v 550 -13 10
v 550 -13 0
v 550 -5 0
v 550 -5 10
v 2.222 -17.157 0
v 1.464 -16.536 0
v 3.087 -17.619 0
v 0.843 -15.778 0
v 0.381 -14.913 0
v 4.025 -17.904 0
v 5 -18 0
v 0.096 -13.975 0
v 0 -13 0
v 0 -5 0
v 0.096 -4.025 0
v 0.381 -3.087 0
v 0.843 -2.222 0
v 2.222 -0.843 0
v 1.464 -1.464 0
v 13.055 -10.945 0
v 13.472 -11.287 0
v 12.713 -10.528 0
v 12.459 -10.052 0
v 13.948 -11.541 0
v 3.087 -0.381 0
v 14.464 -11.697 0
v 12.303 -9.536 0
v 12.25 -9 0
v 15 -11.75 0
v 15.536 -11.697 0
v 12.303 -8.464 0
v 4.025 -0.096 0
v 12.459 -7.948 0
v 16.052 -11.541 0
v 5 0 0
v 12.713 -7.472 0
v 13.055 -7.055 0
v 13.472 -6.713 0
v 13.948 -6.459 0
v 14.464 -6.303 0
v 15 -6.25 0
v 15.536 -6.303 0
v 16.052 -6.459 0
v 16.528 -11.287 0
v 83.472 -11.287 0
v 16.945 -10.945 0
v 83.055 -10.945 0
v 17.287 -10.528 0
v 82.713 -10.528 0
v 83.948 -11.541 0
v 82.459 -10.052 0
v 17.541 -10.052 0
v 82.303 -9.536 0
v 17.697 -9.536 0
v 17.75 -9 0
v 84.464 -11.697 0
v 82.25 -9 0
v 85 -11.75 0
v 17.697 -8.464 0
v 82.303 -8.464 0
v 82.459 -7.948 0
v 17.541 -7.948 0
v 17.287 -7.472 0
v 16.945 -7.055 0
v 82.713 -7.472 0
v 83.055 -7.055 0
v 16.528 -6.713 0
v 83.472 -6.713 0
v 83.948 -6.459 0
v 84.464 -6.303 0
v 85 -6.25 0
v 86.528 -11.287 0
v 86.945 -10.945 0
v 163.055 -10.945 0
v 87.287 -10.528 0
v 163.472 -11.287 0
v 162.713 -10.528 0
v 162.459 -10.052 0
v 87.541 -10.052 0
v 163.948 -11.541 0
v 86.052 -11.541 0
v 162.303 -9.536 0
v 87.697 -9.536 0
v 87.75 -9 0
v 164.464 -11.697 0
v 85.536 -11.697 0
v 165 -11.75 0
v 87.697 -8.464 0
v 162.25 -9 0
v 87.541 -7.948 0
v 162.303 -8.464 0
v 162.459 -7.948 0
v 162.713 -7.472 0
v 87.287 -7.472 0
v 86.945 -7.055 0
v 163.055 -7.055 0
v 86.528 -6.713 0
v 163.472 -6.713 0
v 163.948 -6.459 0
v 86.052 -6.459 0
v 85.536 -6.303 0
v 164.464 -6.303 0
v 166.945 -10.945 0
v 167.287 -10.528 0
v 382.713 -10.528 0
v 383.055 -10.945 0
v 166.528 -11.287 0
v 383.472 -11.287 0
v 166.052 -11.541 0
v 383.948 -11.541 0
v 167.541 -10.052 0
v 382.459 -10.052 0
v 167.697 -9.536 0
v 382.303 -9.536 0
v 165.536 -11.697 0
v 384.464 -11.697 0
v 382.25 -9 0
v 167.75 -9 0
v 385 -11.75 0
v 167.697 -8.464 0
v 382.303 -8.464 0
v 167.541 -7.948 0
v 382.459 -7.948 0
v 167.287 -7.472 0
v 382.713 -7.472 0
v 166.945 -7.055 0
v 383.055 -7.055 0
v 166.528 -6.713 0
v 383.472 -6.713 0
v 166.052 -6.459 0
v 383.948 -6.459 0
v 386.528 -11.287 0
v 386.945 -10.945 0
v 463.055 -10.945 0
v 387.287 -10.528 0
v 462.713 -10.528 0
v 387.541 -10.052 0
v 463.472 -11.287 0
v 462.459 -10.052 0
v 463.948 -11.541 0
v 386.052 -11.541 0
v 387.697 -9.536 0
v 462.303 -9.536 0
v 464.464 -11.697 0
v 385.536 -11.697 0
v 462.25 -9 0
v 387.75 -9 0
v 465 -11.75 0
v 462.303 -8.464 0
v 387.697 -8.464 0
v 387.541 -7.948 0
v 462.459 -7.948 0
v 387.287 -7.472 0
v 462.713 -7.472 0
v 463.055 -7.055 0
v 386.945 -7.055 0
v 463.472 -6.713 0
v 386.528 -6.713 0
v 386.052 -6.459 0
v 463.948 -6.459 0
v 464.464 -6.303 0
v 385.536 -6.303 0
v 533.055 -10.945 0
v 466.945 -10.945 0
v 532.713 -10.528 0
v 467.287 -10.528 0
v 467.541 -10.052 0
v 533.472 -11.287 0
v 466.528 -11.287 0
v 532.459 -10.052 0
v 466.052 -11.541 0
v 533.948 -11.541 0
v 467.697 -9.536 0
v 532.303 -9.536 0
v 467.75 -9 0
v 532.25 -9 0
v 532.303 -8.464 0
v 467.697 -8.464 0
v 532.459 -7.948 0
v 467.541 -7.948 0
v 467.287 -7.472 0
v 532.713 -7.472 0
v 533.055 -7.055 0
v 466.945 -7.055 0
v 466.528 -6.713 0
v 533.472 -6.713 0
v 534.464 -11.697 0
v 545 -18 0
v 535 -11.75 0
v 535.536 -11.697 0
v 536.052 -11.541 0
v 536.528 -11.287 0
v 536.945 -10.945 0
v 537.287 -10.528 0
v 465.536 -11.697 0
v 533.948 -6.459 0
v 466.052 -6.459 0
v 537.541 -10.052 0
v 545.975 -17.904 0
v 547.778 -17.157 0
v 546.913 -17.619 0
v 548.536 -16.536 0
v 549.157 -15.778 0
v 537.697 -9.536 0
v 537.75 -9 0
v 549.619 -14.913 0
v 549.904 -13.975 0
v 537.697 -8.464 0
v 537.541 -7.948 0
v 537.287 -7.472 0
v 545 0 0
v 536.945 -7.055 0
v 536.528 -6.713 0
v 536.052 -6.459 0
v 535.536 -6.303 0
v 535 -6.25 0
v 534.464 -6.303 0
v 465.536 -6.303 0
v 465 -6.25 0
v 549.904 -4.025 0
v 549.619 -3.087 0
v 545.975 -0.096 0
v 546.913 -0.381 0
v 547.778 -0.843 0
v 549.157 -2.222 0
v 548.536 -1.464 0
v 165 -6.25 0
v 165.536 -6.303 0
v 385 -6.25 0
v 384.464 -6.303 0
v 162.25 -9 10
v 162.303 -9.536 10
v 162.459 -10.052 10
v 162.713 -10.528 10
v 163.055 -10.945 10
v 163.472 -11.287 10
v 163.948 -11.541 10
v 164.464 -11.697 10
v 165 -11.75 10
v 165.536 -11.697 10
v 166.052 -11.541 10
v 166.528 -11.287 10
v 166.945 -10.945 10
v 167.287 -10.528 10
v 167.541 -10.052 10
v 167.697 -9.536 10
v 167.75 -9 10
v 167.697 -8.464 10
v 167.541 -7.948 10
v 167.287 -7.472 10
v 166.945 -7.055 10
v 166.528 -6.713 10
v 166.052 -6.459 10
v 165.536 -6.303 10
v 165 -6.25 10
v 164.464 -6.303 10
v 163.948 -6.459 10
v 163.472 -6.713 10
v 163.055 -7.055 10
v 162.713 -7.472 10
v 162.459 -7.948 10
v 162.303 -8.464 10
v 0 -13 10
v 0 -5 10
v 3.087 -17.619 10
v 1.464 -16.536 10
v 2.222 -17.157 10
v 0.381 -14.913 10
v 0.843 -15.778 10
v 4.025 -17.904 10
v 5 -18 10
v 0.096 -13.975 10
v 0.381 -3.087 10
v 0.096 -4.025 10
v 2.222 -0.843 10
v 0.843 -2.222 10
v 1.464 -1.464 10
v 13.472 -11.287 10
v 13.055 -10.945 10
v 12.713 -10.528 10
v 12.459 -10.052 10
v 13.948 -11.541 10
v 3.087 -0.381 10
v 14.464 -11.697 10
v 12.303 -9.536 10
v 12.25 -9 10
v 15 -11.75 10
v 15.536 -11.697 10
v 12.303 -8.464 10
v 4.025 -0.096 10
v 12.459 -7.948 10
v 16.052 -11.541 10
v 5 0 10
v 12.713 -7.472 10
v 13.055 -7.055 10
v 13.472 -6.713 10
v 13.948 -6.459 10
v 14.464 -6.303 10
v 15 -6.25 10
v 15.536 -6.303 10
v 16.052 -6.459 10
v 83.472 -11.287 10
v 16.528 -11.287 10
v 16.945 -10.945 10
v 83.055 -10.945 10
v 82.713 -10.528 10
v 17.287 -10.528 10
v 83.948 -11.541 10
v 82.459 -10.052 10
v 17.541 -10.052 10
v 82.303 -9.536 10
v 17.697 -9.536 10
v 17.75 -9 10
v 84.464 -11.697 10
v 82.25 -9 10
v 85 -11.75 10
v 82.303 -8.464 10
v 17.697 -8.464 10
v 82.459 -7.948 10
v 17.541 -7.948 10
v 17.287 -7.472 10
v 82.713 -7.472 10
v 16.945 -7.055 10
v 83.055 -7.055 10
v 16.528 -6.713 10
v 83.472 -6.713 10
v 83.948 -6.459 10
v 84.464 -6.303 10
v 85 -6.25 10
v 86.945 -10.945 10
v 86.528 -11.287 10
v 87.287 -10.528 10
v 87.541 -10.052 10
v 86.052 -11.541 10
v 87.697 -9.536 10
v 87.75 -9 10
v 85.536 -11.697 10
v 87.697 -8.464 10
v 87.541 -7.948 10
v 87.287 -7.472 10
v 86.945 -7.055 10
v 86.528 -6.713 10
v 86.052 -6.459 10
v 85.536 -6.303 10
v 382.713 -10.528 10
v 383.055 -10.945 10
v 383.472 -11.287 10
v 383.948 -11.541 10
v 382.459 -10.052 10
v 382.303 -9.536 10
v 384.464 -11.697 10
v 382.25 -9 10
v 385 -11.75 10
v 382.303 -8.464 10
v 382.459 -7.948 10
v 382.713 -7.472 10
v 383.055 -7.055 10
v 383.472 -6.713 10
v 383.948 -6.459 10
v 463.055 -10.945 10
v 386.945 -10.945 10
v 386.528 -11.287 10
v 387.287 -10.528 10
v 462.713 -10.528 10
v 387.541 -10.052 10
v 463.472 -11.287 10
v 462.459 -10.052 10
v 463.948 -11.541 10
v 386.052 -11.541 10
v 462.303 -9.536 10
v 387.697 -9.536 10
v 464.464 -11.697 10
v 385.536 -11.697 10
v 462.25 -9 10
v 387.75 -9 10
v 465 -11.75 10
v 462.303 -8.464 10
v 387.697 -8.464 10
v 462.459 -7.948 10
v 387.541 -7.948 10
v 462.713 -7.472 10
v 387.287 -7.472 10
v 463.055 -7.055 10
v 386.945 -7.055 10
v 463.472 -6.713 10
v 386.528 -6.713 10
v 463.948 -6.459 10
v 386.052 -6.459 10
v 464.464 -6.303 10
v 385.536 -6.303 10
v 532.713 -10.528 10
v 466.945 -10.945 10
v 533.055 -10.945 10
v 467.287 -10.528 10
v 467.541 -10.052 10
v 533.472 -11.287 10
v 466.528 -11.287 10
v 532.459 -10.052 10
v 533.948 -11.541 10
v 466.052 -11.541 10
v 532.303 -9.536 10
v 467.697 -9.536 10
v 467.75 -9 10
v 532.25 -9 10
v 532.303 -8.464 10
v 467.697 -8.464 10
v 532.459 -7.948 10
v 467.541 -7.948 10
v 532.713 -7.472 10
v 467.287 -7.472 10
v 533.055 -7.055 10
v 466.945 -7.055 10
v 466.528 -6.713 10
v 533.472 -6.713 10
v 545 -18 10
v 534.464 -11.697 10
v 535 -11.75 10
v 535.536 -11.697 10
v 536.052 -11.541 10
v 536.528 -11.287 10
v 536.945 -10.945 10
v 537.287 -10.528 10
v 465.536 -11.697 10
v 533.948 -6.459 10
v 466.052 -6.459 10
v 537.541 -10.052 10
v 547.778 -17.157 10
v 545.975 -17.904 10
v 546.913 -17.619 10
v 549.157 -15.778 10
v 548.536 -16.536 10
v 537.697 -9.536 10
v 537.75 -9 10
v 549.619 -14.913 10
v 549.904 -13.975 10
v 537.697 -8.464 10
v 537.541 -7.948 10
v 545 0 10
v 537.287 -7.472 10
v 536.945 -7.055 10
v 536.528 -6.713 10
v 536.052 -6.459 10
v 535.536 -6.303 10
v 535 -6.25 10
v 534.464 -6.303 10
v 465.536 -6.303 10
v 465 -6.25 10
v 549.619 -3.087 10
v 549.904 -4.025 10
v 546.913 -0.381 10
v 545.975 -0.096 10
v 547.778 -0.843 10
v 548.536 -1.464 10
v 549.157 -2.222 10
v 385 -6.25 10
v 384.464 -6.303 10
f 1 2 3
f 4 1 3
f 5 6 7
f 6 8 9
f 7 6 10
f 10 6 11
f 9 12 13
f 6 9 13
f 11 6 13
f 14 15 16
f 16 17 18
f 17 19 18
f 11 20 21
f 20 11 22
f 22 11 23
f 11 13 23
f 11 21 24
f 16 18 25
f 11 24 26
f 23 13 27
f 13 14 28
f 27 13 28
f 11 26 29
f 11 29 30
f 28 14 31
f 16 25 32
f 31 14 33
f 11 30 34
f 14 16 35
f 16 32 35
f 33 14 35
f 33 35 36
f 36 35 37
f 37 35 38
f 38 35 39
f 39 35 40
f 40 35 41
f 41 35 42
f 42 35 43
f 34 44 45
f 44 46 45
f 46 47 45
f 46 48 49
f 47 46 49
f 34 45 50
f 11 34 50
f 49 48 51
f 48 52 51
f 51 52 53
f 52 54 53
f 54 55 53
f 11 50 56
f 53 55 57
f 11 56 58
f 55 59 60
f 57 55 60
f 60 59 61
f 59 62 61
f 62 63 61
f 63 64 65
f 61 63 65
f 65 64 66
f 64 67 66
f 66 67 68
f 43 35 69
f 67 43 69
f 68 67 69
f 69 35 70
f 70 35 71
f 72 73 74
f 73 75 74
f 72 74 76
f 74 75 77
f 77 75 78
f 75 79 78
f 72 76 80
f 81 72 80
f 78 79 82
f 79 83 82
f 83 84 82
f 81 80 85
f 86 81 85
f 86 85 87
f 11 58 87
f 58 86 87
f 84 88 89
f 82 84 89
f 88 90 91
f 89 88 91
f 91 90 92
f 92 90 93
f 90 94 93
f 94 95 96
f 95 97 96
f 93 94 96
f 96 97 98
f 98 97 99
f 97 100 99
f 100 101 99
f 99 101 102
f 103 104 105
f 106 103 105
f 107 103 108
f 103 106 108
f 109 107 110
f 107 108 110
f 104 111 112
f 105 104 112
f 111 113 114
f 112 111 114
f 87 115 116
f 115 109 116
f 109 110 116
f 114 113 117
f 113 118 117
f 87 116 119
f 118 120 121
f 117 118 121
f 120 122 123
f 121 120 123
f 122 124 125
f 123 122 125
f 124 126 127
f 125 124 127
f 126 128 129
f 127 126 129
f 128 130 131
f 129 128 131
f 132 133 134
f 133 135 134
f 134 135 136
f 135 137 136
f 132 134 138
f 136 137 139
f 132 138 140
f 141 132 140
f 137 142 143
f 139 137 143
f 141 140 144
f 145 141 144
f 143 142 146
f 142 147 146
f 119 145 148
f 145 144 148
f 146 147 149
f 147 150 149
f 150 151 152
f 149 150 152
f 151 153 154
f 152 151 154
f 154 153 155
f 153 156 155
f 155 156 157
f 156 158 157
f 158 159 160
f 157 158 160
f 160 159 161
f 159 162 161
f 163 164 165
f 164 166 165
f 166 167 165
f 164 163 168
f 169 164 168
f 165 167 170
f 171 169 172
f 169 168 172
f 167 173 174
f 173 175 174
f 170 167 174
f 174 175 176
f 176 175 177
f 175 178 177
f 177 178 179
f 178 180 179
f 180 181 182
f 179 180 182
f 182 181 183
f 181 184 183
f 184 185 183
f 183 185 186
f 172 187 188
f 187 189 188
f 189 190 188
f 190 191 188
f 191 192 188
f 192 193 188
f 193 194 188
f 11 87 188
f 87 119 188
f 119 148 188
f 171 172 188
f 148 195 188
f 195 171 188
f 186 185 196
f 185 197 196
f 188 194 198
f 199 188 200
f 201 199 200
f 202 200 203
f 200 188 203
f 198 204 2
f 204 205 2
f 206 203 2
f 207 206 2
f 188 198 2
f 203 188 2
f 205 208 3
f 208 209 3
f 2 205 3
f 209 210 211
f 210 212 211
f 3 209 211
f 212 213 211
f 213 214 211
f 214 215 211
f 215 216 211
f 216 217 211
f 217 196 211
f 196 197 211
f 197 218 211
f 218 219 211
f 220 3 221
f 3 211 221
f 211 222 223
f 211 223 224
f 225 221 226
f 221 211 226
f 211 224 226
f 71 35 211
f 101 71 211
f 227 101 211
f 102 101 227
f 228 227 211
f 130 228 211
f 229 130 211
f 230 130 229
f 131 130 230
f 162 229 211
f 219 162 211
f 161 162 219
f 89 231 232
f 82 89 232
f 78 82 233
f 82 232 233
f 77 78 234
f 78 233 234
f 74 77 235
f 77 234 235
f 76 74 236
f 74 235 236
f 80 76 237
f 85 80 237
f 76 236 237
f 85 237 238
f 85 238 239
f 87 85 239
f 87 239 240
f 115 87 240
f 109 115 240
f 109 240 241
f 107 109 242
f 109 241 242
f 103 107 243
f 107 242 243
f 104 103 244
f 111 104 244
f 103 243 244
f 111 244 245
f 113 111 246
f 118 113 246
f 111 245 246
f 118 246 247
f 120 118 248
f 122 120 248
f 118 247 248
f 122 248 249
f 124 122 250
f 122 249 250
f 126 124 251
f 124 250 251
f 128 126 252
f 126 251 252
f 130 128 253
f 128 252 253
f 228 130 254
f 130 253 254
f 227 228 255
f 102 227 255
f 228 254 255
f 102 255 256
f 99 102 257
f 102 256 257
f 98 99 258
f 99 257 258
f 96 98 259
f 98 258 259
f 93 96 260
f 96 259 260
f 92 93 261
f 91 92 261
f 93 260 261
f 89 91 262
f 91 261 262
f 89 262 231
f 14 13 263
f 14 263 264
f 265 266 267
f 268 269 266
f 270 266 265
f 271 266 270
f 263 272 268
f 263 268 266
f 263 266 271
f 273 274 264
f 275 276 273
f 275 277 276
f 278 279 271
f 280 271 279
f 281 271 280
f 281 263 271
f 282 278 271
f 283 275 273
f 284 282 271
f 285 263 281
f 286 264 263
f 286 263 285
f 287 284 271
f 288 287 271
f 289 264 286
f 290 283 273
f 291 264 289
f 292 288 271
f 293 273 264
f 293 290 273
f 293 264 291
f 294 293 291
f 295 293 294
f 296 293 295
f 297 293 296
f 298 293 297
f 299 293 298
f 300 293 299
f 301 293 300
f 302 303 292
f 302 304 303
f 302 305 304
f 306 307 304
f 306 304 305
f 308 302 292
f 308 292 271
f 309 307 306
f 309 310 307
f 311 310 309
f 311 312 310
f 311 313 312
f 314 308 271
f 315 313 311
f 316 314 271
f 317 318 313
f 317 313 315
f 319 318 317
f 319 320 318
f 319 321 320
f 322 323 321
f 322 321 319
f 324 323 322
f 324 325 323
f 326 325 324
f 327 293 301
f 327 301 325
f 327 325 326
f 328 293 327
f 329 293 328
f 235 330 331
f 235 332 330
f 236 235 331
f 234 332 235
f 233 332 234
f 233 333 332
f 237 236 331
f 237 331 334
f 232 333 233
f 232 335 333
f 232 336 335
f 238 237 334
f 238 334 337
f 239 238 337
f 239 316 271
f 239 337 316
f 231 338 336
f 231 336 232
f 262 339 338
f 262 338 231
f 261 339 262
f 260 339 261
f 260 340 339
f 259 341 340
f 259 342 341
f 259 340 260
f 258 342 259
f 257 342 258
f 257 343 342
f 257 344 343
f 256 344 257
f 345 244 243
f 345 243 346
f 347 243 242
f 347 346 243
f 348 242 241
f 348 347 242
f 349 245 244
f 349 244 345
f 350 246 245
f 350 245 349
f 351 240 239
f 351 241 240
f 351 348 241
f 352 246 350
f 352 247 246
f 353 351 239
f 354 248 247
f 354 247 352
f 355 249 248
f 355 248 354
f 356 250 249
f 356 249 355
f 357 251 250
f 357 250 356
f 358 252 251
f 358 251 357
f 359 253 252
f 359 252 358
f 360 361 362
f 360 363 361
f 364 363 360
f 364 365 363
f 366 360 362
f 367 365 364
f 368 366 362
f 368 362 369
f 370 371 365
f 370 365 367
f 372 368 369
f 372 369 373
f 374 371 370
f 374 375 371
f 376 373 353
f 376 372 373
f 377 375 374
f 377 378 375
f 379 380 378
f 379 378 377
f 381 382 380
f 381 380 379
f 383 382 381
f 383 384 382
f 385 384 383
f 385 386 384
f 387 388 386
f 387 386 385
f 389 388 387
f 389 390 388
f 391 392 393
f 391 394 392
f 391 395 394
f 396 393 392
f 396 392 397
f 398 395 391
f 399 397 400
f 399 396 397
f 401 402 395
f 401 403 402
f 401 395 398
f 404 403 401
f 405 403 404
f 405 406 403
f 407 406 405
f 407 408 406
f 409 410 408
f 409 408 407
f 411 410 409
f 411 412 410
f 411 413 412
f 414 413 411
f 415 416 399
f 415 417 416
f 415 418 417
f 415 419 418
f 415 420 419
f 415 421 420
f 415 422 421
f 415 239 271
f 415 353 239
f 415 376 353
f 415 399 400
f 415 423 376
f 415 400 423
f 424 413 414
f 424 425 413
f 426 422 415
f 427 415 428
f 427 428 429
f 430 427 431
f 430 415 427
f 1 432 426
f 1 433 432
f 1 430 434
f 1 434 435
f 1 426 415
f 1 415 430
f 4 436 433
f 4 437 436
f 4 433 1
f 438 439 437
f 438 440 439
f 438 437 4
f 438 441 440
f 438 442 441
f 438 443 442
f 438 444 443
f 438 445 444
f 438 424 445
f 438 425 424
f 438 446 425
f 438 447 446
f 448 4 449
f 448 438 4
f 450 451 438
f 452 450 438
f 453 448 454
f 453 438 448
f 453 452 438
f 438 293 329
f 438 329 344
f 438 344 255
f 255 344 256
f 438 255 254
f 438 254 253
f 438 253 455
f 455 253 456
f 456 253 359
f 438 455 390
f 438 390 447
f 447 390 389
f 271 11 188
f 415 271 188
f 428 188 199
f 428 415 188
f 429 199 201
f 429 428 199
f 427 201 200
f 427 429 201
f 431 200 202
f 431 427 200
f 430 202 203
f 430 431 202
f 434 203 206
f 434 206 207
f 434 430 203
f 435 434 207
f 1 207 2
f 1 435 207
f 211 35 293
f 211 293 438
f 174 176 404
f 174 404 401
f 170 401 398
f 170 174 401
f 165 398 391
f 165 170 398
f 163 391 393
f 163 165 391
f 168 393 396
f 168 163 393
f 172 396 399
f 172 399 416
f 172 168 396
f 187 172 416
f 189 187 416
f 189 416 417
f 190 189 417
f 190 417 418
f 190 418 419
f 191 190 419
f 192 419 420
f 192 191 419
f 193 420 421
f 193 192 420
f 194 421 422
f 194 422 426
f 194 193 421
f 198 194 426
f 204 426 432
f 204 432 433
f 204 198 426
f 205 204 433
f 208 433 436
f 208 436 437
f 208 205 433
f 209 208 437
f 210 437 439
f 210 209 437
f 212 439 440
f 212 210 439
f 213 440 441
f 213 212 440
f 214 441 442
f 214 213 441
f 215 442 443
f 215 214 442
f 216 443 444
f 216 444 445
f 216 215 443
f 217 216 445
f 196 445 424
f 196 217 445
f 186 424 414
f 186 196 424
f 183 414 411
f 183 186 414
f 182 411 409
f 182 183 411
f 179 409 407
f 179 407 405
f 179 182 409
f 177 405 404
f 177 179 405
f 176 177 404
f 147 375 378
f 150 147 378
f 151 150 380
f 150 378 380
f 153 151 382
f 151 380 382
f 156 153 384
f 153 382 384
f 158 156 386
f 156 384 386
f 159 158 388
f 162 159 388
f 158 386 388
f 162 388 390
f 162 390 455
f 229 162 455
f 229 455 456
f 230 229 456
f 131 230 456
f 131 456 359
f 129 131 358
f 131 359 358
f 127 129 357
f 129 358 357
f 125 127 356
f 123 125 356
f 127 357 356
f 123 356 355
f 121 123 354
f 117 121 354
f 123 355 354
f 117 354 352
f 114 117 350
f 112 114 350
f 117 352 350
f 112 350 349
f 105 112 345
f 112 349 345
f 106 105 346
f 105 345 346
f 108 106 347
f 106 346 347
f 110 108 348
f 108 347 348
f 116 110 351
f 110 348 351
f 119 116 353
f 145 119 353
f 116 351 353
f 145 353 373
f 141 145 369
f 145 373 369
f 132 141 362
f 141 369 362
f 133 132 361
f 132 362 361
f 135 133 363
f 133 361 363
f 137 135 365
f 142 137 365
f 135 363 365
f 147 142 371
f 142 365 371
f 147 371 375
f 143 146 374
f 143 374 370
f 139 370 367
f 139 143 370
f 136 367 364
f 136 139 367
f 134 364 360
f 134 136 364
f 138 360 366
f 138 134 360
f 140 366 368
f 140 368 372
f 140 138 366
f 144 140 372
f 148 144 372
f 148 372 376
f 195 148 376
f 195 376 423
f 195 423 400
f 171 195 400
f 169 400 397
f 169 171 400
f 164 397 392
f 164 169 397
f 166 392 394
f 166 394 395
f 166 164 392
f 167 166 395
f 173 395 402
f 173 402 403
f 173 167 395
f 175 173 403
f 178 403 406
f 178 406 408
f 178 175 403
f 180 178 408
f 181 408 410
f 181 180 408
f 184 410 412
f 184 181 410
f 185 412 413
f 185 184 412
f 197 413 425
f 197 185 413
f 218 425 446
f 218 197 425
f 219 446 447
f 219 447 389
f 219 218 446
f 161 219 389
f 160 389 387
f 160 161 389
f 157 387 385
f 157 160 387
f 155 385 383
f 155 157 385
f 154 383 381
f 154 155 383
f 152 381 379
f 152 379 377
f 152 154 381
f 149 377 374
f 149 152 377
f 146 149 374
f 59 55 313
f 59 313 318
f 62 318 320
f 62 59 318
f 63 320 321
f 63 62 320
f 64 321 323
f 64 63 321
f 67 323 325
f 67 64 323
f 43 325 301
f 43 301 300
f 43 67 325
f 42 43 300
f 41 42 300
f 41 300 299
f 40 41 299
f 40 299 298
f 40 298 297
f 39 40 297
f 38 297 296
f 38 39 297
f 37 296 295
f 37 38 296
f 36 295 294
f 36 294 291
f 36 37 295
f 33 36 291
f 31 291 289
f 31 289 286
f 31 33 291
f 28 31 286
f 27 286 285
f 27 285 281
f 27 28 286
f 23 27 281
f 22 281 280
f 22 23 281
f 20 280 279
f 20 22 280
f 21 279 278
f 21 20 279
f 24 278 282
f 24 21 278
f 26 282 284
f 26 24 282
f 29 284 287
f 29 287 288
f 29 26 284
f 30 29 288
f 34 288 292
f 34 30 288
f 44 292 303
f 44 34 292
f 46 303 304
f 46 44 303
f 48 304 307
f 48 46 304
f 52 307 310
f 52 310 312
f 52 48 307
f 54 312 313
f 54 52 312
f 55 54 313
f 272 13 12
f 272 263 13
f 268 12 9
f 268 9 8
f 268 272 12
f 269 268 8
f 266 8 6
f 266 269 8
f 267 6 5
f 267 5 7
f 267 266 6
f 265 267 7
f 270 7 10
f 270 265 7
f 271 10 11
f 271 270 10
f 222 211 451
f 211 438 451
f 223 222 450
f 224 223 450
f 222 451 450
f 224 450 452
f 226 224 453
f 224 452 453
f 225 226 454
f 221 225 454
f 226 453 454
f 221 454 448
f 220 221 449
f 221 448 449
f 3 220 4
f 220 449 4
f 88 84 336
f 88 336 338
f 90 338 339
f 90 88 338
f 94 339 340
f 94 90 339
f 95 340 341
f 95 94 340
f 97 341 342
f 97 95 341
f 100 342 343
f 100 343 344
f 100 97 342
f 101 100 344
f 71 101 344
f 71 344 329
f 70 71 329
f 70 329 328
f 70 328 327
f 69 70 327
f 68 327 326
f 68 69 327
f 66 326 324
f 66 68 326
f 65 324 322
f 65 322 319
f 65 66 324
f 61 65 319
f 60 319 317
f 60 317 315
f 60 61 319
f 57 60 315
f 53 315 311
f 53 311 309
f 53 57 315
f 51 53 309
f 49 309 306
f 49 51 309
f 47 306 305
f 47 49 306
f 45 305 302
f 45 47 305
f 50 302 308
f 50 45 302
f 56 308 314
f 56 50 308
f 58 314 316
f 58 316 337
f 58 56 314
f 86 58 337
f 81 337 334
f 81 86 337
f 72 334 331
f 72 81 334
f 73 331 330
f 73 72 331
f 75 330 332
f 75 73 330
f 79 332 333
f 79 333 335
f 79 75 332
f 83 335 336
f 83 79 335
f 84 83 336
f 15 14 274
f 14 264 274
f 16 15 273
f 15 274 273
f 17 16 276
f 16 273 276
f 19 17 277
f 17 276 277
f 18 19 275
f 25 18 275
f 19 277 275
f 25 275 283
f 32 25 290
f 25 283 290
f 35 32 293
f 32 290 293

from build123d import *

# Parameters (mm, degrees)
SKETCH_1_W          = 550
SKETCH_1_H          = 18
SKETCH_1_R          = 2.75
EXTRUDE_1_DEPTH     = 10
FILLET_1_R          = 5
SKETCH_2_R          = 2.75
CUT_EXTRUDE_1_DEPTH = 10


with BuildPart() as part:
    # 草图1 → 凸台-拉伸1 (new body)
    with BuildSketch(Plane.XY):
        with Locations((275, -9)):
            Rectangle(SKETCH_1_W, SKETCH_1_H)
        with Locations((15, -9)):
            Circle(SKETCH_1_R, mode=Mode.SUBTRACT)
        with Locations((85, -9)):
            Circle(SKETCH_1_R, mode=Mode.SUBTRACT)
        with Locations(Location((465, -9, 0), (0, 0, 180))):
            Circle(SKETCH_1_R, mode=Mode.SUBTRACT)
        with Locations(Location((535, -9, 0), (0, 0, 180))):
            Circle(SKETCH_1_R, mode=Mode.SUBTRACT)
    extrude(amount=EXTRUDE_1_DEPTH)

    # 圆角1
    fillet_1_edges = [part.edges().sort_by_distance(p)[0] for p in [
        (0, 0, 5),
        (550, 0, 5),
        (550, -18, 5),
        (0, -18, 5),
    ]]
    fillet(fillet_1_edges, radius=FILLET_1_R)

    # 草图2 → 切除-拉伸1 (cut)
    with BuildSketch(Plane.XY.offset(10)):
        with Locations((385, -9)):
            Circle(SKETCH_2_R)
        with Locations(Location((165, -9, 0), (0, 0, 180))):
            Circle(SKETCH_2_R)
    extrude(amount=-CUT_EXTRUDE_1_DEPTH, mode=Mode.SUBTRACT)


solid = part.part
